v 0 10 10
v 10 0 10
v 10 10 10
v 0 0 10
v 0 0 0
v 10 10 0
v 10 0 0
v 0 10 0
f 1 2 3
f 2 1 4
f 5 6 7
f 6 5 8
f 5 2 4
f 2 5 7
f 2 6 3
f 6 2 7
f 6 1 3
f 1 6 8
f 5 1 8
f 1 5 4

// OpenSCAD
//////////////////////////////////////////////////////////////////////
// Module: docsgen_smoke()
//
// Description:
//   Minimal module used to verify openscad-docsgen in the toolchain.
//
// Arguments:
//   size = Side length of the generated cube.
//////////////////////////////////////////////////////////////////////
module docsgen_smoke(size = 10) {
    cube(size);
}

docsgen_smoke();
